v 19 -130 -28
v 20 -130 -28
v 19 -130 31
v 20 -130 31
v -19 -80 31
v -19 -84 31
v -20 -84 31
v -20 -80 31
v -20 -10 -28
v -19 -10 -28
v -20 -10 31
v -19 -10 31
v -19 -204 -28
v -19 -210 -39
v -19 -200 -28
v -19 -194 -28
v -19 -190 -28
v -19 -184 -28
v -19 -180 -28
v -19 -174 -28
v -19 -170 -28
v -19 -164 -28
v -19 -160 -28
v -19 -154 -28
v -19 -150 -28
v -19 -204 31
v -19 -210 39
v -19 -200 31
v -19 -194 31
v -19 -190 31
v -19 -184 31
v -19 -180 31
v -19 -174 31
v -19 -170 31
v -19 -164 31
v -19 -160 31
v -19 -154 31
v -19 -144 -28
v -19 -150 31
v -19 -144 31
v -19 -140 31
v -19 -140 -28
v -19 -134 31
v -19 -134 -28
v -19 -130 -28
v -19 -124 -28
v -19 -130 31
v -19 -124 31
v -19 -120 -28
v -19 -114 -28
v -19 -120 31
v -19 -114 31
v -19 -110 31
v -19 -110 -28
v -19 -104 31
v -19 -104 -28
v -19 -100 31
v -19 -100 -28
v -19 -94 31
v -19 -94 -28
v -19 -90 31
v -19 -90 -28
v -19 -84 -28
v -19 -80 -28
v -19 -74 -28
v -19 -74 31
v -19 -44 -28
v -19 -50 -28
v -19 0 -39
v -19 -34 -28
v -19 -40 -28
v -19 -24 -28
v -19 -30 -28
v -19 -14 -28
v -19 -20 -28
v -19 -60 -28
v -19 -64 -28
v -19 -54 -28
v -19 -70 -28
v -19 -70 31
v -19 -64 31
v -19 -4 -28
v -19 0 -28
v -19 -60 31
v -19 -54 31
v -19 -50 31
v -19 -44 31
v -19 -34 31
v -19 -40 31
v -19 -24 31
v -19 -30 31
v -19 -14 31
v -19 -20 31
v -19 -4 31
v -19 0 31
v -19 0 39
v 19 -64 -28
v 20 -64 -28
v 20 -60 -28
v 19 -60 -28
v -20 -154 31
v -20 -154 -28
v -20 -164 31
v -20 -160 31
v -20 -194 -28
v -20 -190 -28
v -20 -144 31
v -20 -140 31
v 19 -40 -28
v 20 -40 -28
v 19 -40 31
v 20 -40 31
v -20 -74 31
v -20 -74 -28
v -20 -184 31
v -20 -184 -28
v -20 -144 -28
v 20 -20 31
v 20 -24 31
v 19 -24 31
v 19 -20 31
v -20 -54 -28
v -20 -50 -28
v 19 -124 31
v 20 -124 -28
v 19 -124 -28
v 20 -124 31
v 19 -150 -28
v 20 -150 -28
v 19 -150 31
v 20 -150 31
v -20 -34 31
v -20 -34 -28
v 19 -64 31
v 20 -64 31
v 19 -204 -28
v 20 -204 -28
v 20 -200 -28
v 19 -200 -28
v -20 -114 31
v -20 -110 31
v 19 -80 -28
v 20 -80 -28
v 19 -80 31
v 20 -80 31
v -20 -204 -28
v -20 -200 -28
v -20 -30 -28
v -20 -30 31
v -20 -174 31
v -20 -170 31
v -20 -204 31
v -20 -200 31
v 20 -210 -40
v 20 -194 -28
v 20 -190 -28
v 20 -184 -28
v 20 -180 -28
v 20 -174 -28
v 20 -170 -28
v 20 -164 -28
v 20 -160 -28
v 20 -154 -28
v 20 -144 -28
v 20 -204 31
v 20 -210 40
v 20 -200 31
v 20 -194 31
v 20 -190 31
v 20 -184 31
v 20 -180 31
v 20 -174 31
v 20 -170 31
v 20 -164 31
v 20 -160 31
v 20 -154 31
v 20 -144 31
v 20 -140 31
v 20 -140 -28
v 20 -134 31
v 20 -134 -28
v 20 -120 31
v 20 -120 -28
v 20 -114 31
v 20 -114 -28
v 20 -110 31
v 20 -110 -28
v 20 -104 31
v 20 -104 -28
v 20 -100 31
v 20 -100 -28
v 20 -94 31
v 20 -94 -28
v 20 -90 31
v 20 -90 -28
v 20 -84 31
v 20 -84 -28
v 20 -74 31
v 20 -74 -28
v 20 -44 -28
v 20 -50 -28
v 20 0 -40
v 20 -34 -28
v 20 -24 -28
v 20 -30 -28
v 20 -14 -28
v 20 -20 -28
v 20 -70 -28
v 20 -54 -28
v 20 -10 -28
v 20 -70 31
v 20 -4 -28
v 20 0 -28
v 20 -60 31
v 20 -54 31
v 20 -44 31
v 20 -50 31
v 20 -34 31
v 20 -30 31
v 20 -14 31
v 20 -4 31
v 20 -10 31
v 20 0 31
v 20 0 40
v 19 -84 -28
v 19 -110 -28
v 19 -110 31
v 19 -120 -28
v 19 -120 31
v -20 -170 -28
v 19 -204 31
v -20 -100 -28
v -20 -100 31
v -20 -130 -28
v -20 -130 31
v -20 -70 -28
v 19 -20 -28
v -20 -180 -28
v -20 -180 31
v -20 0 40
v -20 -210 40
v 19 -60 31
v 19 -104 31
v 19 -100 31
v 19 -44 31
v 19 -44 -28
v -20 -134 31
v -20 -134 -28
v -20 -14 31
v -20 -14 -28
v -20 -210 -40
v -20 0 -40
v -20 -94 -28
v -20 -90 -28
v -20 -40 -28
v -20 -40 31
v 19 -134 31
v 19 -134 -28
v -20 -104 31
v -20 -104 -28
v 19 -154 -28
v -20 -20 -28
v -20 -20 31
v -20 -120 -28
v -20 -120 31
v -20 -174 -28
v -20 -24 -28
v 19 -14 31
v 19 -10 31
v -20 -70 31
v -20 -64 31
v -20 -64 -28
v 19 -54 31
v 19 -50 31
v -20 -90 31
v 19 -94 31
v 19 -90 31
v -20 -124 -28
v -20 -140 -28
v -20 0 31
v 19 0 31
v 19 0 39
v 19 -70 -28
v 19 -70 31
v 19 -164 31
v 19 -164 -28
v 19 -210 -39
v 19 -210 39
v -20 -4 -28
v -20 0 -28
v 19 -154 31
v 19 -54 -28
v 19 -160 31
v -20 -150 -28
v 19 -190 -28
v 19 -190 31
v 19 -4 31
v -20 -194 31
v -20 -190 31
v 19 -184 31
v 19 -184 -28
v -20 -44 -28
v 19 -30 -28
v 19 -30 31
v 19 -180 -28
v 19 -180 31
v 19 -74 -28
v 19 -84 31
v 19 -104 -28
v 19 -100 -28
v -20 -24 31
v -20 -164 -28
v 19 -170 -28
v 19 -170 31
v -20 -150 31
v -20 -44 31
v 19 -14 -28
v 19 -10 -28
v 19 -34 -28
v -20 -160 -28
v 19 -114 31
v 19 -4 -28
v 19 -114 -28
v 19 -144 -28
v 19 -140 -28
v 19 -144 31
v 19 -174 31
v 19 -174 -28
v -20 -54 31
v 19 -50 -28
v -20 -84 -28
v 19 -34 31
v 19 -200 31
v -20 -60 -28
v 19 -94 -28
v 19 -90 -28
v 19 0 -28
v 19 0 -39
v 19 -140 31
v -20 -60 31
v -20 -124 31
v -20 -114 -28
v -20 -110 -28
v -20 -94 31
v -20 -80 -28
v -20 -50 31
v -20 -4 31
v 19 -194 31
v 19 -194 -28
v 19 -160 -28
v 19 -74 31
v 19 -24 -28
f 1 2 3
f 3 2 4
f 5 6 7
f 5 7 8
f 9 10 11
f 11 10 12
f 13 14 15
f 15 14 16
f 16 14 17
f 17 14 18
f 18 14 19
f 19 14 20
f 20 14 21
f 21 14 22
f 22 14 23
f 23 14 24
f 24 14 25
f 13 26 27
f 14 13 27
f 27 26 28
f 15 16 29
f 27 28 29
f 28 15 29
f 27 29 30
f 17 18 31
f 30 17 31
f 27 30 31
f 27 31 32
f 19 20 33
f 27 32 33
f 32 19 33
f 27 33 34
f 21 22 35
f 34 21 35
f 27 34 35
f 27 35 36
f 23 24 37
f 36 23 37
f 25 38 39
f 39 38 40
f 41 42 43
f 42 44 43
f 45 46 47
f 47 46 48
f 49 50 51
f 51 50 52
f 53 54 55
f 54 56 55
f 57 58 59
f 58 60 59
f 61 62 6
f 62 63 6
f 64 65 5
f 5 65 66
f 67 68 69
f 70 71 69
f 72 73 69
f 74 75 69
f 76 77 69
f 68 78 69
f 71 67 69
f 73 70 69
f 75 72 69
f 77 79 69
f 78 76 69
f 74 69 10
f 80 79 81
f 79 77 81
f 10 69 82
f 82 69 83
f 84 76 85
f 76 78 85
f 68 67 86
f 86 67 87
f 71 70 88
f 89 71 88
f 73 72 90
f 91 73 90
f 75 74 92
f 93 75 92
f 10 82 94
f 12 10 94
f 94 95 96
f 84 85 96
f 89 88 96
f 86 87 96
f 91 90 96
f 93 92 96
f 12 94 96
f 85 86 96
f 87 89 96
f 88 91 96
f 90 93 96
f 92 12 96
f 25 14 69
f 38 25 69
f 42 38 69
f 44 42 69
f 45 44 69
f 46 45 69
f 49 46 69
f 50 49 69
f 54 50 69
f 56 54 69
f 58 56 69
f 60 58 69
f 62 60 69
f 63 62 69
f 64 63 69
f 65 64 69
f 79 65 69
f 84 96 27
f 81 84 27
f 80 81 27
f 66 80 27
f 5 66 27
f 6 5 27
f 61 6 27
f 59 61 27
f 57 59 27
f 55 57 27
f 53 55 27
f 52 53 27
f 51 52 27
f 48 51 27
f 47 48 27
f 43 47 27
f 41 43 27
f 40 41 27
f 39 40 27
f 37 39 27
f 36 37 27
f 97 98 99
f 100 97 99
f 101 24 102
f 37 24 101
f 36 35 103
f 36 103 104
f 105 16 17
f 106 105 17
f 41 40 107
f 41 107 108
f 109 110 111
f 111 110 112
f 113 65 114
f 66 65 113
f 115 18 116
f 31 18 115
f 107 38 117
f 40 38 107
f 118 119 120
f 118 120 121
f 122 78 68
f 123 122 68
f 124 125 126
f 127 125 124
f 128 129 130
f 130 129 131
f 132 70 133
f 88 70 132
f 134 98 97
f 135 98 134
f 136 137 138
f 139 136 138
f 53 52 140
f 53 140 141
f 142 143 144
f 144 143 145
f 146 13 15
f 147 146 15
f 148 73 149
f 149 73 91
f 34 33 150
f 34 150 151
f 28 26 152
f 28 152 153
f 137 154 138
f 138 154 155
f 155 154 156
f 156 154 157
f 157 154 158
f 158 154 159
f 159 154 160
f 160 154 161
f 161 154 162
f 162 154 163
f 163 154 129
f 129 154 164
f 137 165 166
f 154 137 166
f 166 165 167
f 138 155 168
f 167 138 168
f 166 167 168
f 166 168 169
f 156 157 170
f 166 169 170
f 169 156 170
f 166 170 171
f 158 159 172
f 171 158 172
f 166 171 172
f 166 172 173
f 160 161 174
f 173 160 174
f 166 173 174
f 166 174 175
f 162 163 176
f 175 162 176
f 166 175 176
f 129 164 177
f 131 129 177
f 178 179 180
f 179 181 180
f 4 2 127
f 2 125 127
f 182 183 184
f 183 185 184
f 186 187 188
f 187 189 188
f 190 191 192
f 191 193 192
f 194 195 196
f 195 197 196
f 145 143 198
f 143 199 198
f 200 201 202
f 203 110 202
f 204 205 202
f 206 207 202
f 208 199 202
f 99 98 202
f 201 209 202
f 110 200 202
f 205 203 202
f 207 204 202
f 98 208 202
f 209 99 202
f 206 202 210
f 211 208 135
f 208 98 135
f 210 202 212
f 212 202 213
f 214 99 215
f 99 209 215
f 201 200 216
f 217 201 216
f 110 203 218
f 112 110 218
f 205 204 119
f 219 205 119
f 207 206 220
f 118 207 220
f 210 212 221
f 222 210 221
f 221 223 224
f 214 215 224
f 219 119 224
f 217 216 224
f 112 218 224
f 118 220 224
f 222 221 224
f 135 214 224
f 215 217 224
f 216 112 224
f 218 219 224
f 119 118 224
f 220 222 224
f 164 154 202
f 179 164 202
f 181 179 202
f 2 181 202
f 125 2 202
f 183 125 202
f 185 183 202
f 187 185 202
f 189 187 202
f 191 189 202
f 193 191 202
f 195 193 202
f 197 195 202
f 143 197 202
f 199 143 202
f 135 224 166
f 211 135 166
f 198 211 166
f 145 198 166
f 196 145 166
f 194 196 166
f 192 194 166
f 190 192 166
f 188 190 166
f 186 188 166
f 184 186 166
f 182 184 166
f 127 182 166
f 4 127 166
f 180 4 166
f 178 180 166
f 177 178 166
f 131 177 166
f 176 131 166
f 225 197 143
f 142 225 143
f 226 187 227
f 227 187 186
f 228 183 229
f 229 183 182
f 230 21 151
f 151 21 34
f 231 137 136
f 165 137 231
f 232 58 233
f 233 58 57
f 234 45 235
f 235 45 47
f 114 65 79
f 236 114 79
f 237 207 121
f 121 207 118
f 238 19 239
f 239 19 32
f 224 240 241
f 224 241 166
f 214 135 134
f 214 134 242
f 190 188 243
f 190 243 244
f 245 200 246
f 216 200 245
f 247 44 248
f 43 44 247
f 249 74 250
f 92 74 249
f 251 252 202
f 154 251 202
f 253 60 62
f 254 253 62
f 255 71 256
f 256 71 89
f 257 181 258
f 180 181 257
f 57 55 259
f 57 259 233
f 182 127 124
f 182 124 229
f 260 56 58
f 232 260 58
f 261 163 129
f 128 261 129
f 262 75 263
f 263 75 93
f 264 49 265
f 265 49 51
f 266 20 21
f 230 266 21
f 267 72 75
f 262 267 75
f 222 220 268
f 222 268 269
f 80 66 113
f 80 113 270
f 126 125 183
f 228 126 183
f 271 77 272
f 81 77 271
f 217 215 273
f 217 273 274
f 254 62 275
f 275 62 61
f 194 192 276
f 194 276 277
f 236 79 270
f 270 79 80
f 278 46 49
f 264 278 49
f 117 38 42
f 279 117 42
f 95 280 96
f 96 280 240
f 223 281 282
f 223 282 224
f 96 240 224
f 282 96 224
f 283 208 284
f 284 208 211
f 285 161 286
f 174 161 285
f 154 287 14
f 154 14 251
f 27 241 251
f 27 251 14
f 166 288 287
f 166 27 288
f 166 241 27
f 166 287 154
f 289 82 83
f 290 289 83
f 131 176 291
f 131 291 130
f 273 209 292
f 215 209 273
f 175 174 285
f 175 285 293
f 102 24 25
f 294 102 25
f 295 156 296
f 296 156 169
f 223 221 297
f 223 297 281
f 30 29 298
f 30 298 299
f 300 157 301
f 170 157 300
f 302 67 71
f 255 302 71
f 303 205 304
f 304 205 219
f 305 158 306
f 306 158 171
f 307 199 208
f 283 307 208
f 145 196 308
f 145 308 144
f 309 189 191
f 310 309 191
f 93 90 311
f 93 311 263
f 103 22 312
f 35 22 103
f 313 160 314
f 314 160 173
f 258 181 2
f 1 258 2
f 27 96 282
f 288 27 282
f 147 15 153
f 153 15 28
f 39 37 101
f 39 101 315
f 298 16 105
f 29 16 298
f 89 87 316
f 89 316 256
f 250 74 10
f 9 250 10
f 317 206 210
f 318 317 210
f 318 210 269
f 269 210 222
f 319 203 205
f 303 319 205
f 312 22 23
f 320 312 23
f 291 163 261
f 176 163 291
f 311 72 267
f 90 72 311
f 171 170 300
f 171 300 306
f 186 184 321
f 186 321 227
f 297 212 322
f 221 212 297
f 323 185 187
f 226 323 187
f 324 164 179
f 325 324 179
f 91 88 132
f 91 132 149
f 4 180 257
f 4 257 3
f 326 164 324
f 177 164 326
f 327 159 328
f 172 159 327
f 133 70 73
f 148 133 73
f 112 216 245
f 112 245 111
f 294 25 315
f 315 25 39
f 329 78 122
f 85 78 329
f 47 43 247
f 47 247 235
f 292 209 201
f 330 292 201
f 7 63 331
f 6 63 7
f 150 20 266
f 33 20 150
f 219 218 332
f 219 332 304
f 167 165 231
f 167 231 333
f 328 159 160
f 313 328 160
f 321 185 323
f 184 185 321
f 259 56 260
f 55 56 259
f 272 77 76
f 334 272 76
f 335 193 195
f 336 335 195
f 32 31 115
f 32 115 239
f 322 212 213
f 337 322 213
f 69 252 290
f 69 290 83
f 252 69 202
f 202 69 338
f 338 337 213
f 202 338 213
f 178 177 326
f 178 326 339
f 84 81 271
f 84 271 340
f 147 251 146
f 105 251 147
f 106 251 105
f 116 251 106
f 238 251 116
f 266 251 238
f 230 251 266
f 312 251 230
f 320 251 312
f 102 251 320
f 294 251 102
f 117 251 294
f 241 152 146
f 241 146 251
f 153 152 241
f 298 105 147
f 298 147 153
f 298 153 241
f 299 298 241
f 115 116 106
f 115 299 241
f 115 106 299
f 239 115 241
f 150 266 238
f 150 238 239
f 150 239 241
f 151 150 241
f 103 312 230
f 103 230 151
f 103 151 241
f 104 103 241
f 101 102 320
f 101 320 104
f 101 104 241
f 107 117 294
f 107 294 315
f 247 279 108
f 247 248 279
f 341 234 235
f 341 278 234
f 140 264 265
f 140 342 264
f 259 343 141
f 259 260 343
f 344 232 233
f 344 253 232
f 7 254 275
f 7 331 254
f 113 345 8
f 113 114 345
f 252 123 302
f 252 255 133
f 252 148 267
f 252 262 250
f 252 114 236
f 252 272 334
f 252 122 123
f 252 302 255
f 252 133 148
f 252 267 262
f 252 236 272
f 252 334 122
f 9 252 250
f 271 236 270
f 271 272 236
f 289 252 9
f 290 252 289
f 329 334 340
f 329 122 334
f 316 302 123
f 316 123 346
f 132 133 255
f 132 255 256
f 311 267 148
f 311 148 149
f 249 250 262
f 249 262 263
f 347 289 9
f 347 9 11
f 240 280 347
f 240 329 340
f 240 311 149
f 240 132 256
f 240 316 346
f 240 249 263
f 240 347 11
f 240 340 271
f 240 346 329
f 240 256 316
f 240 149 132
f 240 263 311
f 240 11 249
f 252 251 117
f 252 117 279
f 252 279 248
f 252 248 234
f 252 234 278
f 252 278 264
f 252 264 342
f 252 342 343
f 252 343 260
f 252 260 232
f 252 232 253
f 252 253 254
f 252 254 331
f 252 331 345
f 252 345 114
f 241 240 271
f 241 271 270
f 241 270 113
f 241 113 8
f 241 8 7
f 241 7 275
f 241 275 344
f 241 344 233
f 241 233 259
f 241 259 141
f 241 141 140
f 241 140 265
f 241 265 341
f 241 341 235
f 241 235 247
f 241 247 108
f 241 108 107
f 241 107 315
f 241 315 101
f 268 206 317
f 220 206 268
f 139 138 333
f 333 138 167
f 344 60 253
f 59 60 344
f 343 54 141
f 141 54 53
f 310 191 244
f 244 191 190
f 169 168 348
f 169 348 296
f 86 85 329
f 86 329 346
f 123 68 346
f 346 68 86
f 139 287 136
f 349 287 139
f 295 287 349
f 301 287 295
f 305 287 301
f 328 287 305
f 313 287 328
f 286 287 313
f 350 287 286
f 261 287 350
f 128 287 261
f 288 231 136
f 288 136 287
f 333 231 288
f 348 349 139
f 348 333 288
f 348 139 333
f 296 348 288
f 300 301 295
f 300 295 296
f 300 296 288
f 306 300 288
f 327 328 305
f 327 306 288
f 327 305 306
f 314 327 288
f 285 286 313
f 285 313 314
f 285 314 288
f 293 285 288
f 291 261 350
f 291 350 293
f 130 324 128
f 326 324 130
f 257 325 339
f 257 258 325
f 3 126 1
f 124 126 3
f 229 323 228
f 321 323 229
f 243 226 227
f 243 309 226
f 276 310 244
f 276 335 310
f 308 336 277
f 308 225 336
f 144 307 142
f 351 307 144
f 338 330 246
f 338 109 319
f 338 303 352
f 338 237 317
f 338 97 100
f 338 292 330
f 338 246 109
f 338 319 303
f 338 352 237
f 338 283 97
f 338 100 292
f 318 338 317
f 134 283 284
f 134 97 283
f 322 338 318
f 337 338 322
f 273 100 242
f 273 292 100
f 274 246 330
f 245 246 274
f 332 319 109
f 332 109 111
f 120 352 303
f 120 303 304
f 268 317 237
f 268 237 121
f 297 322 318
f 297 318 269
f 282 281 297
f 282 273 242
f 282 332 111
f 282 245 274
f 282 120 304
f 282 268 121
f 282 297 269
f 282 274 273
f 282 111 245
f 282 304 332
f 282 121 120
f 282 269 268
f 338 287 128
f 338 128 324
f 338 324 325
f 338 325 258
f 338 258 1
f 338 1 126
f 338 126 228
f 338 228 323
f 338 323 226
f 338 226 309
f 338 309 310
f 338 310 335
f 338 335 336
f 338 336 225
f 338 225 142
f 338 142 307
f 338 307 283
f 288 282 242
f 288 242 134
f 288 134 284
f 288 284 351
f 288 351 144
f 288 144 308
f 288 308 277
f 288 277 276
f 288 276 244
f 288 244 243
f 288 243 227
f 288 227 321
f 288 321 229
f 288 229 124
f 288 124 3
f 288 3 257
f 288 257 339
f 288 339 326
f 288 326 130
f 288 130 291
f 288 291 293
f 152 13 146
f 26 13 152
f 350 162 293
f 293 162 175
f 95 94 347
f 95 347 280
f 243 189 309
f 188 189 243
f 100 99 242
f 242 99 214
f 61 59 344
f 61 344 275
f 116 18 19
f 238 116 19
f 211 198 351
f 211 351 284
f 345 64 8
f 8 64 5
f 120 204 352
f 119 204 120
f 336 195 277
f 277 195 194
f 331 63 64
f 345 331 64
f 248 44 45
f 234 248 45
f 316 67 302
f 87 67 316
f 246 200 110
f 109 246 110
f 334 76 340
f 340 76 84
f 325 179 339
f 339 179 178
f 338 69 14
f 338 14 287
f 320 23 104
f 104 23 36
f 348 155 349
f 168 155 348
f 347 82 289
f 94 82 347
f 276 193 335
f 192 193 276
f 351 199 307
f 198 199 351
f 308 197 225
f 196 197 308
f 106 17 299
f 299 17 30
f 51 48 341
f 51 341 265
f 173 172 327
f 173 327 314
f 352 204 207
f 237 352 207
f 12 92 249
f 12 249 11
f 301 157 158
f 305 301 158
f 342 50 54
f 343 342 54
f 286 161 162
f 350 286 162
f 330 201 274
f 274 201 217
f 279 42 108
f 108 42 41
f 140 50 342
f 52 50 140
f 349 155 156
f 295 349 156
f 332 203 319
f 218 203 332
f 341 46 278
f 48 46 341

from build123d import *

# Parameters (mm, degrees)
F1_W     = 40
F1_H     = 80
F2_DEPTH = 210
F3_T     = -1
F4_W     = 4
F4_H     = 59
F5_DEPTH = 40.001


with BuildPart() as f2:
    # F1 (on Front) → F2 (new body)
    with BuildSketch(Plane.XZ):
        Rectangle(F1_W, F1_H)
    extrude(amount=F2_DEPTH)

    # F3
    f3_openings = [f2.faces().sort_by_distance(p)[0] for p in [
        (0, -210, 0),
        (0, 0, 0),
    ]]
    offset(amount=F3_T, openings=f3_openings)

    # F4 (on face) → F5 (cut, through all)
    with BuildSketch(Plane.YZ.offset(20)):
        with Locations((-202, 1.5)):
            Rectangle(F4_W, F4_H)
        with Locations((-192, 1.5)):
            Rectangle(F4_W, F4_H)
        with Locations((-182, 1.5)):
            Rectangle(F4_W, F4_H)
        with Locations((-172, 1.5)):
            Rectangle(F4_W, F4_H)
        with Locations((-162, 1.5)):
            Rectangle(F4_W, F4_H)
        with Locations((-152, 1.5)):
            Rectangle(F4_W, F4_H)
        with Locations((-142, 1.5)):
            Rectangle(F4_W, F4_H)
        with Locations((-132, 1.5)):
            Rectangle(F4_W, F4_H)
        with Locations((-122, 1.5)):
            Rectangle(F4_W, F4_H)
        with Locations((-112, 1.5)):
            Rectangle(F4_W, F4_H)
        with Locations((-102, 1.5)):
            Rectangle(F4_W, F4_H)
        with Locations((-92, 1.5)):
            Rectangle(F4_W, F4_H)
        with Locations((-82, 1.5)):
            Rectangle(F4_W, F4_H)
        with Locations((-72, 1.5)):
            Rectangle(F4_W, F4_H)
        with Locations((-62, 1.5)):
            Rectangle(F4_W, F4_H)
        with Locations((-52, 1.5)):
            Rectangle(F4_W, F4_H)
        with Locations((-42, 1.5)):
            Rectangle(F4_W, F4_H)
        with Locations((-32, 1.5)):
            Rectangle(F4_W, F4_H)
        with Locations((-22, 1.5)):
            Rectangle(F4_W, F4_H)
        with Locations((-12, 1.5)):
            Rectangle(F4_W, F4_H)
        with Locations((-2, 1.5)):
            Rectangle(F4_W, F4_H)
        with Locations((8, 1.5)):
            Rectangle(F4_W, F4_H)
        with Locations((18, 1.5)):
            Rectangle(F4_W, F4_H)
        with Locations((28, 1.5)):
            Rectangle(F4_W, F4_H)
        with Locations((38, 1.5)):
            Rectangle(F4_W, F4_H)
        with Locations((48, 1.5)):
            Rectangle(F4_W, F4_H)
        with Locations((58, 1.5)):
            Rectangle(F4_W, F4_H)
        with Locations((68, 1.5)):
            Rectangle(F4_W, F4_H)
        with Locations((78, 1.5)):
            Rectangle(F4_W, F4_H)
        with Locations((88, 1.5)):
            Rectangle(F4_W, F4_H)
        with Locations((98, 1.5)):
            Rectangle(F4_W, F4_H)
        with Locations((108, 1.5)):
            Rectangle(F4_W, F4_H)
        with Locations((118, 1.5)):
            Rectangle(F4_W, F4_H)
        with Locations((128, 1.5)):
            Rectangle(F4_W, F4_H)
        with Locations((138, 1.5)):
            Rectangle(F4_W, F4_H)
        with Locations((148, 1.5)):
            Rectangle(F4_W, F4_H)
        with Locations((158, 1.5)):
            Rectangle(F4_W, F4_H)
        with Locations((168, 1.5)):
            Rectangle(F4_W, F4_H)
        with Locations((178, 1.5)):
            Rectangle(F4_W, F4_H)
        with Locations((198, 1.5)):
            Rectangle(F4_W, F4_H)
        with Locations((208, 1.5)):
            Rectangle(F4_W, F4_H)
        with Locations((218, 1.5)):
            Rectangle(F4_W, F4_H)
        with Locations((228, 1.5)):
            Rectangle(F4_W, F4_H)
        with Locations((238, 1.5)):
            Rectangle(F4_W, F4_H)
        with Locations((188, 1.5)):
            Rectangle(F4_W, F4_H)
    extrude(amount=-F5_DEPTH, mode=Mode.SUBTRACT)


solid = f2.part
